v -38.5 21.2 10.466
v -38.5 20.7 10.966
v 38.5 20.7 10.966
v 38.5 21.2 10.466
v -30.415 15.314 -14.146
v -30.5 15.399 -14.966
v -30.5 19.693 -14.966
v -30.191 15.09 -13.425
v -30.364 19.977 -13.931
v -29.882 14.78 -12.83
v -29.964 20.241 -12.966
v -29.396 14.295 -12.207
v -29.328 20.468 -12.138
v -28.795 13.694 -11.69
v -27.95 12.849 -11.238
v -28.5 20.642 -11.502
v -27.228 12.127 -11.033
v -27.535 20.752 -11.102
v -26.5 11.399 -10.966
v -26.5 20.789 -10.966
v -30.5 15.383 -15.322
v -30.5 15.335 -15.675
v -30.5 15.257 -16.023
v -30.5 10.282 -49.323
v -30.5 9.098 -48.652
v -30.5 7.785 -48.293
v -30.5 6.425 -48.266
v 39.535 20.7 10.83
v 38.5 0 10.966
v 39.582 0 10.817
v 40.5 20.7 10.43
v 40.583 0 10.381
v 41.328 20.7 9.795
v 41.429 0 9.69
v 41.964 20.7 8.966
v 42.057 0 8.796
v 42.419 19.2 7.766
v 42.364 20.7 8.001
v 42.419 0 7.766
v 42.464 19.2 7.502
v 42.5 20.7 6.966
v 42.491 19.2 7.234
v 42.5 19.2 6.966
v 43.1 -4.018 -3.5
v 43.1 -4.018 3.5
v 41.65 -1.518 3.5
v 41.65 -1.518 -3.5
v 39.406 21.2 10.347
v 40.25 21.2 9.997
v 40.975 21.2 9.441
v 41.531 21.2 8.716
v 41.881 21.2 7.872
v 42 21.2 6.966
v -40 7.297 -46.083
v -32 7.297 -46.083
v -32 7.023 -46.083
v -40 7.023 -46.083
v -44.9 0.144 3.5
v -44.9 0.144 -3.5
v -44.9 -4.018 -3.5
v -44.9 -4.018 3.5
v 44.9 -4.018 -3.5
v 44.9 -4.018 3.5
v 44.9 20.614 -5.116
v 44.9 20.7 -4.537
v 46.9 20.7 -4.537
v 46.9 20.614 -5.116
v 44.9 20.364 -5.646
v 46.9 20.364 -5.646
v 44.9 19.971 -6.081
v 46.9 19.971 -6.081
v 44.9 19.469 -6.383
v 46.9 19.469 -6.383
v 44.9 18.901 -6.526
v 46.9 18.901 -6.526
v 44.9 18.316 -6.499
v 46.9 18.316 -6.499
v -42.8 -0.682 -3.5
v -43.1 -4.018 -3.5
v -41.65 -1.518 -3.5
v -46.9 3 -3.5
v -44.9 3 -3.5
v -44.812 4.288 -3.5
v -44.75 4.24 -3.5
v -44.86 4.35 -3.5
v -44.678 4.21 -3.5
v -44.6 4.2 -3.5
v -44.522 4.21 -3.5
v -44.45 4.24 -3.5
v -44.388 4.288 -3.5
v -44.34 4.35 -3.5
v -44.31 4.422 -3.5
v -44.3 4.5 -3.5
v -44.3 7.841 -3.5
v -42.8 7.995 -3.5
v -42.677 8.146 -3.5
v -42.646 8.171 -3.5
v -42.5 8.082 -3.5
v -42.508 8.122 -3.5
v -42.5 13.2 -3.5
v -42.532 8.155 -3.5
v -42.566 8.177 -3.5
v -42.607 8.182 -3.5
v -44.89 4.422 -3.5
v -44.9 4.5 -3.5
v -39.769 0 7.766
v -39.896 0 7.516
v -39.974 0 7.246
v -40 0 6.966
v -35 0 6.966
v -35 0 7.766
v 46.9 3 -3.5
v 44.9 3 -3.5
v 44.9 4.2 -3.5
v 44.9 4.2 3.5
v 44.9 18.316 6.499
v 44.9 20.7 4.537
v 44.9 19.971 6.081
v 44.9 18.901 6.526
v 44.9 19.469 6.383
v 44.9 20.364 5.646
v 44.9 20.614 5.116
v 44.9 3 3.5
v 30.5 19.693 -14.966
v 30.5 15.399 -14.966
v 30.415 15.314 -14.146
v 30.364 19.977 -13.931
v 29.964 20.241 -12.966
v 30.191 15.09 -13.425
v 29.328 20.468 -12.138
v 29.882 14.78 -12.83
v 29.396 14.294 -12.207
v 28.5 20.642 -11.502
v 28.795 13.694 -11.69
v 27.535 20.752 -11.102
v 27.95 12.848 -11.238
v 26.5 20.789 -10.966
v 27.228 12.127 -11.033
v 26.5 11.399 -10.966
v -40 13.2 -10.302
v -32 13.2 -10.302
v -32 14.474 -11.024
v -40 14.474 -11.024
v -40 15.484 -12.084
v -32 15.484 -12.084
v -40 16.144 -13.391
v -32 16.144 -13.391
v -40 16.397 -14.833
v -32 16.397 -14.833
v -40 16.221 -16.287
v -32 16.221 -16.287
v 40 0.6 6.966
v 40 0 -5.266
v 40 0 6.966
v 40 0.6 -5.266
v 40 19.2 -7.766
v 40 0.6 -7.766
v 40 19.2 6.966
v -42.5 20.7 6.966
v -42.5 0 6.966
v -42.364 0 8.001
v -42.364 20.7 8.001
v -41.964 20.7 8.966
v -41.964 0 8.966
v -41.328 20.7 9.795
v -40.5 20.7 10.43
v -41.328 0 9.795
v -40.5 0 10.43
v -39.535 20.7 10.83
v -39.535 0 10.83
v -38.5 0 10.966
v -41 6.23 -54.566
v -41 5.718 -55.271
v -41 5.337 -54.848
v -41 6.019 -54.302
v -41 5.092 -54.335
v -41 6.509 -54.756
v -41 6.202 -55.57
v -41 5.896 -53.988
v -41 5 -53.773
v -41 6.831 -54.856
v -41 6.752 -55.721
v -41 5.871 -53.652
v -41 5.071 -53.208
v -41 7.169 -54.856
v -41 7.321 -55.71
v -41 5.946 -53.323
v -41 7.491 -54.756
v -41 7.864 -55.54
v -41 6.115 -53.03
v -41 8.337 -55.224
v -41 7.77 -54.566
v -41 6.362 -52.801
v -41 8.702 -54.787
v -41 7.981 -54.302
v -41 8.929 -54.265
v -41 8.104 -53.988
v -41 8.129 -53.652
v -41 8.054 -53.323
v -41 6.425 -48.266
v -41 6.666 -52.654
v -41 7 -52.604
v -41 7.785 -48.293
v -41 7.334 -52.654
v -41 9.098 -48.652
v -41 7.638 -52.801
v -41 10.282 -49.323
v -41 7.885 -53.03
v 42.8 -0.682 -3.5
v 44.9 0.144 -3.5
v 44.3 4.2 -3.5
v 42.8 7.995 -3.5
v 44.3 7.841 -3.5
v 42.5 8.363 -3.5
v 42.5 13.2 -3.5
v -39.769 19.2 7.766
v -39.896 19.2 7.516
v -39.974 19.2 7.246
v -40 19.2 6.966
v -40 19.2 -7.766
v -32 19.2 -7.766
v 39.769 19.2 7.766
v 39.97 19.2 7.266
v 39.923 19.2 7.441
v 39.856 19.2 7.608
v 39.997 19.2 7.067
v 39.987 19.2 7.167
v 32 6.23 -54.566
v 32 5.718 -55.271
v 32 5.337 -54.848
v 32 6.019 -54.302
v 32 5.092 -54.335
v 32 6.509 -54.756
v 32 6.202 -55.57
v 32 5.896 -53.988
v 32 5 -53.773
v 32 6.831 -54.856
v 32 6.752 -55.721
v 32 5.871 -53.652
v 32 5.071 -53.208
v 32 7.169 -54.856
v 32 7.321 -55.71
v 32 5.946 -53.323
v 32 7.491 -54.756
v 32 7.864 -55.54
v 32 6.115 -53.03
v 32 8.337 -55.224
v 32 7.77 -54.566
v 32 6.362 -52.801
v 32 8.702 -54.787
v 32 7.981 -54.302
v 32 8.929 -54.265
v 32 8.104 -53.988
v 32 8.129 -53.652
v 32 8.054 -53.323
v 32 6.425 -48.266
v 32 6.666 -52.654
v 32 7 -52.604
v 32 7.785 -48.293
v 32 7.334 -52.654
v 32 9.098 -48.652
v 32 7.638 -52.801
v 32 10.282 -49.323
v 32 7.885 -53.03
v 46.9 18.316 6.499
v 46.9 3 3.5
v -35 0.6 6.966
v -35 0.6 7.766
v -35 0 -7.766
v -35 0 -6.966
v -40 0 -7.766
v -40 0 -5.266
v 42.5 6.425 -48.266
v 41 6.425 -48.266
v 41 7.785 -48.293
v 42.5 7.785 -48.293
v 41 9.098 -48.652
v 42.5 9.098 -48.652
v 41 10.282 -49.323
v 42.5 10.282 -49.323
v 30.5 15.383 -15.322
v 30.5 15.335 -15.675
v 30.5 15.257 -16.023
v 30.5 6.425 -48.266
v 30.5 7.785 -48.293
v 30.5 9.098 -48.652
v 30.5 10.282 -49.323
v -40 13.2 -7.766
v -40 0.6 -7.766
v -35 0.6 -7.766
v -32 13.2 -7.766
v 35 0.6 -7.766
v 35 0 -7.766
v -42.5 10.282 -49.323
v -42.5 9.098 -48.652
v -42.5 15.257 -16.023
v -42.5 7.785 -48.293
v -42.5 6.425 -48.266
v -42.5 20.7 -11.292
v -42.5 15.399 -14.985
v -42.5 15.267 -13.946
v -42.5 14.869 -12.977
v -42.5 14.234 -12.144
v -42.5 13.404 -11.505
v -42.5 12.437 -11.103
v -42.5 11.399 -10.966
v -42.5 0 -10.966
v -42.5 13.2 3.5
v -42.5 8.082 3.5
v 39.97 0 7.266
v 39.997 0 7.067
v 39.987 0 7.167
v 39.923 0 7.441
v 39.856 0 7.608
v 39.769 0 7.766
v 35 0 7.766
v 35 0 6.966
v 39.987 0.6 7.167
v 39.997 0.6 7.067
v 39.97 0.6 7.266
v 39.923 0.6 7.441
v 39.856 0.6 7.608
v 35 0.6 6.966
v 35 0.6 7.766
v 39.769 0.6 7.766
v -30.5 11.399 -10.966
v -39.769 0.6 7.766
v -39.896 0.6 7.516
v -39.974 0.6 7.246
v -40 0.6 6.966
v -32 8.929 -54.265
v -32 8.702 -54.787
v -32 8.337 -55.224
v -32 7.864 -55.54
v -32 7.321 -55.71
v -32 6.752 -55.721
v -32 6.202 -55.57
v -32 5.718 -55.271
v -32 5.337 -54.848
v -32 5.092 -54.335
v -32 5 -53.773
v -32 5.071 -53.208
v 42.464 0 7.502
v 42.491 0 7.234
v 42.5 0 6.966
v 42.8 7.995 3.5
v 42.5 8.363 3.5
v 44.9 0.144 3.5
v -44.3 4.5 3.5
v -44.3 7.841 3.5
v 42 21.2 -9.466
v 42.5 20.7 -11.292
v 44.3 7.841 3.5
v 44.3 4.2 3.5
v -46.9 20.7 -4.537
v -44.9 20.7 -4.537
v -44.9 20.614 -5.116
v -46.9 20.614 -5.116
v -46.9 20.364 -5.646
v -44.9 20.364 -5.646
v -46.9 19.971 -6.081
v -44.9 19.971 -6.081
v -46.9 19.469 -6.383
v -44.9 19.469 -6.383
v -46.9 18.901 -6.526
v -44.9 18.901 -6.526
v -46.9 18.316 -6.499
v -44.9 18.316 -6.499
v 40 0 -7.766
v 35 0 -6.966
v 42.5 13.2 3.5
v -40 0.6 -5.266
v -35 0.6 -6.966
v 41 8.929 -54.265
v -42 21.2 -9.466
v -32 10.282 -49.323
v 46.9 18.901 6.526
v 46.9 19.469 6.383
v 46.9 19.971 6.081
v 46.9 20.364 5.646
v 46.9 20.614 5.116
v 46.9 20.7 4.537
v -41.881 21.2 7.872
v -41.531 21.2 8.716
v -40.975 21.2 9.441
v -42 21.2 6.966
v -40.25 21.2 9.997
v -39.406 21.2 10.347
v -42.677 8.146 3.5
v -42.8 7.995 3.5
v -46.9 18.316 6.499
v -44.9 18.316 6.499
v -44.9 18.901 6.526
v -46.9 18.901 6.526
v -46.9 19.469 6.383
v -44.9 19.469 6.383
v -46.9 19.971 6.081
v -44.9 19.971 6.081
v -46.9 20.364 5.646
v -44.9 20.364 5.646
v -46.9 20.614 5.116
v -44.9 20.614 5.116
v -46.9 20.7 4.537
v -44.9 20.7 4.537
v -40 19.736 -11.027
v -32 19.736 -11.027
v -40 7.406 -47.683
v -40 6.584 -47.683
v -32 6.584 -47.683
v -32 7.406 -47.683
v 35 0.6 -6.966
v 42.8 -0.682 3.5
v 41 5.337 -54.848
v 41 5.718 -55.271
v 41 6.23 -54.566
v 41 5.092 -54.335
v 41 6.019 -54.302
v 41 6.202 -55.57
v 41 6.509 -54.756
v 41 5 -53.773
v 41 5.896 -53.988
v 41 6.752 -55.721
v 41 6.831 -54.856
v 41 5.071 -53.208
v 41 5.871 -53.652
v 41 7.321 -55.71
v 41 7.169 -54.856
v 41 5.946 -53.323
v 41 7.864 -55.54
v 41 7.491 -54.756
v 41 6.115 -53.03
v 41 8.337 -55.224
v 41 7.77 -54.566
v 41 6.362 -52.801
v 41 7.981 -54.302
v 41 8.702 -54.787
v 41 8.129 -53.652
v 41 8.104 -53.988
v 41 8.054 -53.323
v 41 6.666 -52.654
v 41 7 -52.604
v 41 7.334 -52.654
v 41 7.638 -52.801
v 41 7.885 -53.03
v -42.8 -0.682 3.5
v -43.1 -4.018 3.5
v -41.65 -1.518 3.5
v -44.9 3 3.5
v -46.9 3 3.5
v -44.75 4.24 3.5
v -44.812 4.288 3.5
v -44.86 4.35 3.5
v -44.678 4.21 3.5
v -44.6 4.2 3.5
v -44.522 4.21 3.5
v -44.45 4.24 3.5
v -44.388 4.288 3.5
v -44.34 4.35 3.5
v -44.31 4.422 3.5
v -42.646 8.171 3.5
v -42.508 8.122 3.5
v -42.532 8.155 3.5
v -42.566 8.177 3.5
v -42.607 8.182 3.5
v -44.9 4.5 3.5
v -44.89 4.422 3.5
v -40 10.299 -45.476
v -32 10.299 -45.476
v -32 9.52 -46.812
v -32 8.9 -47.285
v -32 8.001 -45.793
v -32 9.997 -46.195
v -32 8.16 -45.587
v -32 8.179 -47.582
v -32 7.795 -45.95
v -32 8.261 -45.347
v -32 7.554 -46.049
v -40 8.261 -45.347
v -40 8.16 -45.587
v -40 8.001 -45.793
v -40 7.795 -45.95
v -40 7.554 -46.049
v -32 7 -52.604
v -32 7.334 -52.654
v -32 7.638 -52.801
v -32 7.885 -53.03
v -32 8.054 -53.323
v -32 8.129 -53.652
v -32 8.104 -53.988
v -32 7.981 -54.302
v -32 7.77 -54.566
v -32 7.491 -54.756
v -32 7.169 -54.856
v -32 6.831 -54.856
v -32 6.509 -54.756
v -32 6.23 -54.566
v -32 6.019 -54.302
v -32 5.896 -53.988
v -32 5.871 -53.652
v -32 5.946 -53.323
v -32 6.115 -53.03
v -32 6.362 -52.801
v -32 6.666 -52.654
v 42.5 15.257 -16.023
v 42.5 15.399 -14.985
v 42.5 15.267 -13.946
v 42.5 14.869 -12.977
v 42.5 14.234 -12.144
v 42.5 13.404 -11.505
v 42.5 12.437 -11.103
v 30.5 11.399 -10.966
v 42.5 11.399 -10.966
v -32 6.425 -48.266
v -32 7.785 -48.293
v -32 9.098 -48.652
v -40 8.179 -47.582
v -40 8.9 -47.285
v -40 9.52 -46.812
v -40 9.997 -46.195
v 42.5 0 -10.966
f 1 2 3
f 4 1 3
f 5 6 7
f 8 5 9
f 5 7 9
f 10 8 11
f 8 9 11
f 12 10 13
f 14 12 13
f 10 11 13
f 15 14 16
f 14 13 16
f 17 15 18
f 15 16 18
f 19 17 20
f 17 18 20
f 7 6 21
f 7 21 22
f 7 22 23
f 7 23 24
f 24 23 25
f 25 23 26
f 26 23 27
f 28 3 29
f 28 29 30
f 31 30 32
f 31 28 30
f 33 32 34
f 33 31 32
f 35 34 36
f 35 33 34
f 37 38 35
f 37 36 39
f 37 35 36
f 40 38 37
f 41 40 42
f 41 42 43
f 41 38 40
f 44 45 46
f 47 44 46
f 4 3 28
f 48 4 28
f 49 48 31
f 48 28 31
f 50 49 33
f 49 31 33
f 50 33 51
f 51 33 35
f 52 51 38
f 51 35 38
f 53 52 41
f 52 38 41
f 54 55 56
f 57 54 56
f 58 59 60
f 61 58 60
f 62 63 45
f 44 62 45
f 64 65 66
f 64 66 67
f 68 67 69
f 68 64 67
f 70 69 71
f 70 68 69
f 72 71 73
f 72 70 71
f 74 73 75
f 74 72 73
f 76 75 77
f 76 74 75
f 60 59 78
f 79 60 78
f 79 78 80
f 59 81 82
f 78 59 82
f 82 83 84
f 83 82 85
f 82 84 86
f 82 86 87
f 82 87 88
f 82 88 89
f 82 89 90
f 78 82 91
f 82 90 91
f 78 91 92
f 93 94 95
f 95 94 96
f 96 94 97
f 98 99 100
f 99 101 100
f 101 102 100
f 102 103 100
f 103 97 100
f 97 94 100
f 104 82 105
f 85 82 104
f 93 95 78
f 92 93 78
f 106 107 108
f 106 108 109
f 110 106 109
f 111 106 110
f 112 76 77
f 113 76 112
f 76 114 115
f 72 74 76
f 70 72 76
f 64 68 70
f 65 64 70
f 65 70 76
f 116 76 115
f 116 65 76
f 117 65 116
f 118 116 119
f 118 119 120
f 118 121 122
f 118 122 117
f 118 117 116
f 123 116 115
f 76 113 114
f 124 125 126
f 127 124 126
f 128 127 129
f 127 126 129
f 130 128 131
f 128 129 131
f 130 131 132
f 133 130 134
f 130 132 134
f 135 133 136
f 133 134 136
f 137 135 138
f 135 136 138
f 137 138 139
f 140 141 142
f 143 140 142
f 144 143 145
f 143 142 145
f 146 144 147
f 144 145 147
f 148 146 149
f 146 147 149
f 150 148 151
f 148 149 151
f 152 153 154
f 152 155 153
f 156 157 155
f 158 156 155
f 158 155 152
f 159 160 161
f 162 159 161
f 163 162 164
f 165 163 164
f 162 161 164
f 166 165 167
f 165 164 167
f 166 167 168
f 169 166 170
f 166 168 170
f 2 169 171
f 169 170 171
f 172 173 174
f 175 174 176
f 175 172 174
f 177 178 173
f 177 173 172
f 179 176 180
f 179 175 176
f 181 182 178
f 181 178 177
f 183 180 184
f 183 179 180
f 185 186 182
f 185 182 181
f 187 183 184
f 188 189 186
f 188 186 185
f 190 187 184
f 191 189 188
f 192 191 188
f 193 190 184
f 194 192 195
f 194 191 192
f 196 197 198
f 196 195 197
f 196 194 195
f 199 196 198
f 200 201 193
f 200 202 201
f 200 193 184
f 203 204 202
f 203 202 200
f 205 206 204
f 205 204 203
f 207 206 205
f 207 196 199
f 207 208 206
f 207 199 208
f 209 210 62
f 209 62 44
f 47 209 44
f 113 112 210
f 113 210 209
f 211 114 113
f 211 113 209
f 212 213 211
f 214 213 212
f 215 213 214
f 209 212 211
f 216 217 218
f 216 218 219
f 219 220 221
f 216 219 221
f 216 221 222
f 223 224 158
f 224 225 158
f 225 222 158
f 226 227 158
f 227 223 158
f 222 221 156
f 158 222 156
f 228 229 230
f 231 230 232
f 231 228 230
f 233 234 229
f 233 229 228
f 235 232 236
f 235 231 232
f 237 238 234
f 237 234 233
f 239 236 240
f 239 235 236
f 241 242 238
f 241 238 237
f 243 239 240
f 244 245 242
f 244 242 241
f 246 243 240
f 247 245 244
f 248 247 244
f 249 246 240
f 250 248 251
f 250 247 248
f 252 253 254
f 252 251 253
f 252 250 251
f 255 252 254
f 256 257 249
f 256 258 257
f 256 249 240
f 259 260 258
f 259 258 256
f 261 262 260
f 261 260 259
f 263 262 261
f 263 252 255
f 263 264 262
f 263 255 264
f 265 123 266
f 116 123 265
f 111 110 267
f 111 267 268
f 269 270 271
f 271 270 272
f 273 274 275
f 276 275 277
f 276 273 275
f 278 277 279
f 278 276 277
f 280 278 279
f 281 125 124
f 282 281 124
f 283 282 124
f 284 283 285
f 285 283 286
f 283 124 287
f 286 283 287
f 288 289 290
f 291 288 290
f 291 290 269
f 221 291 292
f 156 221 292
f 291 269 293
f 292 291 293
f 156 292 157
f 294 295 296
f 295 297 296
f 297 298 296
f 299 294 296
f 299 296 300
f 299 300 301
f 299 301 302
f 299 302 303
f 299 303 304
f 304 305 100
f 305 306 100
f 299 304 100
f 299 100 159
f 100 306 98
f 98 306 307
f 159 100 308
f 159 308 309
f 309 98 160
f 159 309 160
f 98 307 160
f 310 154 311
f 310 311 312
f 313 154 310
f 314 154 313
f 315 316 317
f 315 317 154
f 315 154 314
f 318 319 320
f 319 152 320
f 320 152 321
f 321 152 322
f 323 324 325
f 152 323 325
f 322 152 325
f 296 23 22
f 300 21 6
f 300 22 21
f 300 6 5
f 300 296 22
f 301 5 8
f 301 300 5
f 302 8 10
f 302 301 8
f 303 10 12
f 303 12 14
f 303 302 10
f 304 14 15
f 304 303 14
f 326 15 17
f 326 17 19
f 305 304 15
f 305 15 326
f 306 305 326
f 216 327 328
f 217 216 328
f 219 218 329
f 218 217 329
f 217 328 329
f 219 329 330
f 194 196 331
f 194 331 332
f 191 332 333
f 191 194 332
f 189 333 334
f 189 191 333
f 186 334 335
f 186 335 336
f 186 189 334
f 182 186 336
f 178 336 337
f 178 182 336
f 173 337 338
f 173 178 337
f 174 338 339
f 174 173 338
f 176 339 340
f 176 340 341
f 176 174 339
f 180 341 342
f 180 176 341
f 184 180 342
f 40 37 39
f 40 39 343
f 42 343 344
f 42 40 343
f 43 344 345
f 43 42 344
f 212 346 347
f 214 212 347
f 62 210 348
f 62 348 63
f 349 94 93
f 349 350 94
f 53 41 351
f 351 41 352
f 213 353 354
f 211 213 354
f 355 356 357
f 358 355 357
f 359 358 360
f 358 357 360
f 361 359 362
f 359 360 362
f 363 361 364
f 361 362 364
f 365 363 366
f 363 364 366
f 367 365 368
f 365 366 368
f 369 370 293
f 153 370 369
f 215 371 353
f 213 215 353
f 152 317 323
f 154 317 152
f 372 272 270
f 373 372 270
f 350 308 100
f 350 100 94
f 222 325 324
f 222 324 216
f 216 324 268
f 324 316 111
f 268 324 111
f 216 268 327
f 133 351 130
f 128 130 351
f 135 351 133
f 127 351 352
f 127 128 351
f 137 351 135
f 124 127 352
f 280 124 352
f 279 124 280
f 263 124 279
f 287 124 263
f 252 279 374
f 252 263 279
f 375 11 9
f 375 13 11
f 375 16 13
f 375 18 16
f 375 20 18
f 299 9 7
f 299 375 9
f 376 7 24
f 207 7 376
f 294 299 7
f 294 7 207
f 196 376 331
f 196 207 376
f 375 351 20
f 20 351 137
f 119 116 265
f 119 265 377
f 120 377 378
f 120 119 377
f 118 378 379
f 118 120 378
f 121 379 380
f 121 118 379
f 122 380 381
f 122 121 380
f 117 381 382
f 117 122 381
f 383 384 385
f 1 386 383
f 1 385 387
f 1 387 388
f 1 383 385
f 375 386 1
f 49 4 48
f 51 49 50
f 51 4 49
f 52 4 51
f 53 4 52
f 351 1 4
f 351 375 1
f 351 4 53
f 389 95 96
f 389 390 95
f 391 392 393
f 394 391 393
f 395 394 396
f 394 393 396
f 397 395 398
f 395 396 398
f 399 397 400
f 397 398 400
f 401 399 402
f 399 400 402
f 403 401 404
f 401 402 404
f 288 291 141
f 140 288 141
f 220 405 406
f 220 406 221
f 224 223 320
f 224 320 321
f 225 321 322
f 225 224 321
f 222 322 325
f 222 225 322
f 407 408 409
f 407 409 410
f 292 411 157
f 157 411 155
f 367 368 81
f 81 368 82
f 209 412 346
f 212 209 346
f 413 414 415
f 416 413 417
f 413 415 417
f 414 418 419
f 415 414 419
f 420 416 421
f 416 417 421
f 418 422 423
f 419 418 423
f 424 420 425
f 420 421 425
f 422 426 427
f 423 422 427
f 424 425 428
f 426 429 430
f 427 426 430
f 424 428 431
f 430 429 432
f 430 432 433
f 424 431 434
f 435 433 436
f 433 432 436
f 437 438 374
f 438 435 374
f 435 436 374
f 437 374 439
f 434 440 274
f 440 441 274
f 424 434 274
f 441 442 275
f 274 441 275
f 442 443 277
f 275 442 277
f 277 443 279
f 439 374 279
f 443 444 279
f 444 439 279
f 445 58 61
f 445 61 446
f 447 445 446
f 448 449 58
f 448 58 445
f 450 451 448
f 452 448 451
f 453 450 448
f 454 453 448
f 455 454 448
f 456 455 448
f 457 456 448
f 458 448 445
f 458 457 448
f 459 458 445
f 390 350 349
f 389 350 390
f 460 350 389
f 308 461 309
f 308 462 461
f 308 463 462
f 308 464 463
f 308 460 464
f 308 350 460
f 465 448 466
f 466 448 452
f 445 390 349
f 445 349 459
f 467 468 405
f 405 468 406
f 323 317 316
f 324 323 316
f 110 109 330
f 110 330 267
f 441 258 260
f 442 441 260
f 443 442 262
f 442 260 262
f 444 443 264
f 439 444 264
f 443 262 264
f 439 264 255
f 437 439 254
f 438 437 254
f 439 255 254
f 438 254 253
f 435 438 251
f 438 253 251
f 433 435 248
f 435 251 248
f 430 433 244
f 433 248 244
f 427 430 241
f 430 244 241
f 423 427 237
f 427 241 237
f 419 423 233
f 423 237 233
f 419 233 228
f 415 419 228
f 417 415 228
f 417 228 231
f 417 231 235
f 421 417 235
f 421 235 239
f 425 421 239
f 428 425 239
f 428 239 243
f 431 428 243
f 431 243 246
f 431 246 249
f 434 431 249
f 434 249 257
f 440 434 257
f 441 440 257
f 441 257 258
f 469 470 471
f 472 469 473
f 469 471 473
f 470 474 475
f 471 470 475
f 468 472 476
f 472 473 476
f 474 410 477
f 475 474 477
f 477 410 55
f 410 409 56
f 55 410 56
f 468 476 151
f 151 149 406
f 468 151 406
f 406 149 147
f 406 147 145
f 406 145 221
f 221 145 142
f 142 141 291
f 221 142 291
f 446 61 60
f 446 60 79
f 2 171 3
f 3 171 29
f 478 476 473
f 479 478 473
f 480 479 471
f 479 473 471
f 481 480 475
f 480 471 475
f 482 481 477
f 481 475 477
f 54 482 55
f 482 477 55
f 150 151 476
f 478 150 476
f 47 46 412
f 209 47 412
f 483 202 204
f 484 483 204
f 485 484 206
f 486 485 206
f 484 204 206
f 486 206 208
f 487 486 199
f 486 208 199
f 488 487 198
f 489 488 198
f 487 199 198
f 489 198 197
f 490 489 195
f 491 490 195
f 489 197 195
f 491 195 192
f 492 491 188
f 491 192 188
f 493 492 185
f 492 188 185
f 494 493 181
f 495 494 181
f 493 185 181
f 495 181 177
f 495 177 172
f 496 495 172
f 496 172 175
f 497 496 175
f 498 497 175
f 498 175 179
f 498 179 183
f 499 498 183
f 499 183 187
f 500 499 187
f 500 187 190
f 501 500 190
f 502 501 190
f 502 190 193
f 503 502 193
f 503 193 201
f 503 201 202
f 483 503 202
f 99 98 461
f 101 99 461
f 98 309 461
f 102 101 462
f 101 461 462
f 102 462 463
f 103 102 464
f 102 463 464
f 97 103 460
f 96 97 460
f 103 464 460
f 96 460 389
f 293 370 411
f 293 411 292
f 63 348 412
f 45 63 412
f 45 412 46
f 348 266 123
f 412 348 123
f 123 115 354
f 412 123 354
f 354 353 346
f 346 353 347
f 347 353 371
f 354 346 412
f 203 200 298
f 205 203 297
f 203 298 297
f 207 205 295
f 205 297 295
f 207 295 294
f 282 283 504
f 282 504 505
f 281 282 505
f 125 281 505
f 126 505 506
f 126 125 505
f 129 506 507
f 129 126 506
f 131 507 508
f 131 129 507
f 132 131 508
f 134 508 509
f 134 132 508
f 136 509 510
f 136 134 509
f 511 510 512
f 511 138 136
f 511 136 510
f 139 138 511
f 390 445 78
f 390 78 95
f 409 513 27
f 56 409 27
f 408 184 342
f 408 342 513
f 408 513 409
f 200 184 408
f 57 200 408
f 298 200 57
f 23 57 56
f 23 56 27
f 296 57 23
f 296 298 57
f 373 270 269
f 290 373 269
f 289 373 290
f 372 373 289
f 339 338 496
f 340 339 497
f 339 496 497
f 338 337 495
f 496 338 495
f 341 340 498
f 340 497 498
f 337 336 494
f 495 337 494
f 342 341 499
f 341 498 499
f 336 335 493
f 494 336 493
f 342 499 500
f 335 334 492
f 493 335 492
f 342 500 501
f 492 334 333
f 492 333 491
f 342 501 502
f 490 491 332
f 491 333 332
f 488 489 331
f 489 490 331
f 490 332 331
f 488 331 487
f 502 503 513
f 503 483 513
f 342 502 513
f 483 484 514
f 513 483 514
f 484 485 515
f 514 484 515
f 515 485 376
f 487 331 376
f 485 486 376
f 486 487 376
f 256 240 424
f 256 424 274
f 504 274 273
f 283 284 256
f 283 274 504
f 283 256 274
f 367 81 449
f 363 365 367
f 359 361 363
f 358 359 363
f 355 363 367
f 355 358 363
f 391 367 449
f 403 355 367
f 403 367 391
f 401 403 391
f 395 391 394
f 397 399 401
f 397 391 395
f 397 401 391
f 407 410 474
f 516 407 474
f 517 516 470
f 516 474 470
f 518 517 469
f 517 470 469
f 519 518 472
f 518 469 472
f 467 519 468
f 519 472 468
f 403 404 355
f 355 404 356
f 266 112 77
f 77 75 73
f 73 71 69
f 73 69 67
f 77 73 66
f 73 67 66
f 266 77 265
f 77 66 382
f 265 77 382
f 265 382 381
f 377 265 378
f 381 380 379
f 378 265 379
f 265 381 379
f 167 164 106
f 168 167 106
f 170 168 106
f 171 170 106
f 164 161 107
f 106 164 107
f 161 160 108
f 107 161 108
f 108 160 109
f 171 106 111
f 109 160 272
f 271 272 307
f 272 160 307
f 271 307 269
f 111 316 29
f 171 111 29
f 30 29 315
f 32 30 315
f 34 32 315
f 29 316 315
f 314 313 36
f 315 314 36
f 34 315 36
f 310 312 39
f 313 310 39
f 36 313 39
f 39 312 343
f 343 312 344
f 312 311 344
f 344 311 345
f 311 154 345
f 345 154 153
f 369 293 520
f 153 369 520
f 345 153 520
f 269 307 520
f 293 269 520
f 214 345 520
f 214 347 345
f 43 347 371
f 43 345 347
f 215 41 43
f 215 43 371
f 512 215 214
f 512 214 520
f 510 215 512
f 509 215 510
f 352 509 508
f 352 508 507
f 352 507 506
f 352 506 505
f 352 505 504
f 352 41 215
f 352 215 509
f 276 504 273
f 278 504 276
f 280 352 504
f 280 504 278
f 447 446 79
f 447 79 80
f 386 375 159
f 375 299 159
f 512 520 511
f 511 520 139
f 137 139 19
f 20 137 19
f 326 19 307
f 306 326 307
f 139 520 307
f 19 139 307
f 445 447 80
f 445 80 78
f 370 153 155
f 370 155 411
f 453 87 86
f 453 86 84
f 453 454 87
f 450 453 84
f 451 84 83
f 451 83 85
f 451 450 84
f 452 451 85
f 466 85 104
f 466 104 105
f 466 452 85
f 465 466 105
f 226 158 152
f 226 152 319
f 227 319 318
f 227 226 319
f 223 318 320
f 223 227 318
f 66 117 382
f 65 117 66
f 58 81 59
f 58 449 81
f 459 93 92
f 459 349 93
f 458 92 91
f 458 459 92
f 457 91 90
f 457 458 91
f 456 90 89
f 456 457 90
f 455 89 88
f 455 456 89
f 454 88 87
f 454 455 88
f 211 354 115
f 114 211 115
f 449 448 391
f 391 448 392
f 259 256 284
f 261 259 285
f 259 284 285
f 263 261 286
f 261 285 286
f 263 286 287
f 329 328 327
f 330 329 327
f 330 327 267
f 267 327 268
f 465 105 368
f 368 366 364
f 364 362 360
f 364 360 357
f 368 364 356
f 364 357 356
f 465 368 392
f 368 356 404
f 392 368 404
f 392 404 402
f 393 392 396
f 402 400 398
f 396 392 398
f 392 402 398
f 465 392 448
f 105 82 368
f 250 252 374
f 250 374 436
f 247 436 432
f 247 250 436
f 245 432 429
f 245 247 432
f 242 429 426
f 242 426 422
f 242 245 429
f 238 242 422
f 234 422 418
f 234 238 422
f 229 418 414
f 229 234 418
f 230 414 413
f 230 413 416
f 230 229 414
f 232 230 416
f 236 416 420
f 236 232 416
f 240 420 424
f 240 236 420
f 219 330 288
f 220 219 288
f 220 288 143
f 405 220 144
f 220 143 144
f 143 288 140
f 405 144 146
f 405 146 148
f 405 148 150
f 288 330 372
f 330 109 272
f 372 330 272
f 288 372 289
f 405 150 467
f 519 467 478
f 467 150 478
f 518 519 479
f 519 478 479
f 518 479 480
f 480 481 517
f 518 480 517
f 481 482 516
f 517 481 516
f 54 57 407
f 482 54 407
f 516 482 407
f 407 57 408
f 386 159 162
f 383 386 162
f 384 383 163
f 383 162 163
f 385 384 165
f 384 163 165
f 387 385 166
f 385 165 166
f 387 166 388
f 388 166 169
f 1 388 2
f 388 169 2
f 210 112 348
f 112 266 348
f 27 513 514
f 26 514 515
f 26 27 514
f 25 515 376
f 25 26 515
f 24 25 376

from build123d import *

# Parameters (mm, degrees)
BOSS_EXTRUDE6_DEPTH            = 42.5
FILLET3_R                      = 4
BOSS_EXTRUDE7_DEPTH            = 19.200000225
SKETCH16_W                     = 12
SKETCH16_H                     = 56.251708931
BOSS_EXTRUDE8_DEPTH            = 21.200000225
MIRROR10_START                 = -2.25e-07
MIRROR10_DEPTH                 = 21.200000225
MIRROR10_START_2               = 19.2
MIRROR10_2_DEPTH               = 2
SKETCH17_R                     = 1.132230372
CUT_EXTRUDE3_DEPTH             = 109.502203117
CHAMFER1_SIZE                  = 0.5
SKETCH18_R                     = 5.5
CUT_EXTRUDE4_DEPTH             = 1.5
MIRROR12_COPY_1_SKETCH_R       = 5.5
MIRROR12_COPY_1_DEPTH          = 1.5
CUT_EXTRUDE7_REACH             = 100.98
CUT_EXTRUDE7_DIRECTION_2_REACH = 100.98
FILLET4_R                      = 4
SKETCH41_W                     = 5
SKETCH41_H                     = 0.8
BOSS_EXTRUDE20_DEPTH           = 0.6
BOSS_EXTRUDE21_DEPTH           = 3.5
BOSS_EXTRUDE23_DEPTH           = 2
FILLET5_R                      = 0.3
FILLET6_R                      = 0.1


# Read off the part's stored shape, not the designer's step: Mirror10
with BuildPart() as part:
    # Sketch14 → Boss-Extrude6 (new body)
    with BuildSketch(Plane(origin=(0, 0, 0), x_dir=(0, 0, -1), z_dir=(1, 0, 0))):
        Polygon((-7.766164208, -2.25e-07), (-10.966164208, -2.25e-07), (-10.966164208, 21.2), (10.966164208, 21.2), (10.966164208, -2.25e-07), (7.766164208, -2.25e-07), (7.766164208, 19.2), (-7.766164208, 19.2), align=None)
    extrude(amount=BOSS_EXTRUDE6_DEPTH)

    # Fillet3
    fillet3_edges = [part.edges().sort_by_distance(p)[0] for p in [
        (42.5, 10.599999888, 10.966164208),
    ]]
    fillet(fillet3_edges, radius=FILLET3_R)

    # Sketch15 → Boss-Extrude7 (add)
    with BuildSketch(Plane.XZ.offset(-19.2)):
        with BuildLine():
            Line((42.5, 6.966164208), (42.5, -7.766164208))
            Line((42.5, -7.766164208), (40, -7.766164208))
            Line((40, -7.766164208), (40, 6.966164208))
            ThreePointArc((40, 6.966164208), (39.99240423, 7.116927651), (39.969693846, 7.266164208))
            ThreePointArc((39.969693846, 7.266164208), (39.448683298, 8.128059212), (38.5, 8.466164208))
            Line((38.5, 8.466164208), (38.5, 10.966164208))
            ThreePointArc((38.5, 10.966164208), (41.029822128, 10.064550885), (42.419183588, 7.766164208))
            ThreePointArc((42.419183588, 7.766164208), (42.479744612, 7.368200056), (42.5, 6.966164208))
        make_face()
    extrude(amount=BOSS_EXTRUDE7_DEPTH)

    # Sketch16 → Boss-Extrude8 (add)
    with BuildSketch(Plane(origin=(0, 21.2, 0), x_dir=(1, 0, 0), z_dir=(0, 1, 0))):
        with Locations((36.5, 35.892018674)):
            Rectangle(SKETCH16_W, SKETCH16_H)
    extrude(amount=-BOSS_EXTRUDE8_DEPTH)

    # Mirror10 outline → Mirror10 (add)
    with BuildSketch(Plane(origin=(0, 0, 0), x_dir=(1, 0, 0), z_dir=(0, 1, 0)).offset(MIRROR10_START)):
        with BuildLine():
            Line((0, -7.766164208), (-39.768857754, -7.766164208))
            ThreePointArc((-39.768857754, -7.766164208), (-39.941056319, -7.382525451), (-40, -6.966164208))
            Line((-40, -6.966164208), (-40, 7.766164208))
            Line((-40, 7.766164208), (0, 7.766164208))
            Line((0, 7.766164208), (0, 10.966164208))
            Line((0, 10.966164208), (-30.5, 10.966164208))
            Line((-30.5, 10.966164208), (-30.5, 64.017873139))
            Line((-30.5, 64.017873139), (-42.5, 64.017873139))
            Line((-42.5, 64.017873139), (-42.5, -6.966164208))
            ThreePointArc((-42.5, -6.966164208), (-41.328427125, -9.794591333), (-38.5, -10.966164208))
            Line((-38.5, -10.966164208), (0, -10.966164208))
            Line((0, -10.966164208), (0, -7.766164208))
        make_face()
    extrude(amount=MIRROR10_DEPTH)

    # Mirror10 2 outline → Mirror10 2 (add)
    with BuildSketch(Plane(origin=(0, 0, 0), x_dir=(1, 0, 0), z_dir=(0, 1, 0)).offset(MIRROR10_START_2)):
        with BuildLine():
            ThreePointArc((-40, -6.966164208), (-39.941056319, -7.382525451), (-39.768857754, -7.766164208))
            Line((-39.768857754, -7.766164208), (0, -7.766164208))
            Line((0, -7.766164208), (0, 7.766164208))
            Line((0, 7.766164208), (-40, 7.766164208))
            Line((-40, 7.766164208), (-40, -6.966164208))
        make_face()
    extrude(amount=MIRROR10_2_DEPTH)

    # Sketch17 → Cut-Extrude3 (cut, through all)
    with BuildSketch(Plane.ZY.offset(42.5)):
        with Locations((-53.736263186, 6.999999775)):
            Circle(SKETCH17_R)
        with BuildLine():
            Line((-9.466164208, 21.2), (-54.264633471, 8.928943746))
            ThreePointArc((-54.264633471, 8.928943746), (-55.665207156, 6.47162949), (-53.207892901, 5.071055805))
            Line((-53.207892901, 5.071055805), (-16.022904778, 15.256651174))
            ThreePointArc((-16.022904778, 15.256651174), (-12.539949284, 14.578933218), (-10.966164208, 11.398763232))
            Line((-10.966164208, 11.398763232), (-10.966164208, -2.25e-07))
            Line((-10.966164208, -2.25e-07), (-58.949878023, -2.25e-07))
            Line((-58.949878023, -2.25e-07), (-64.017873139, -2.25e-07))
            Line((-64.017873139, -2.25e-07), (-64.017873139, 6.372862294))
            Line((-64.017873139, 6.372862294), (-64.017873139, 21.2))
            Line((-64.017873139, 21.2), (-9.466164208, 21.2))
        make_face()
    extrude(amount=-CUT_EXTRUDE3_DEPTH, mode=Mode.SUBTRACT)

    # Chamfer1
    chamfer1_edges = [part.edges().sort_by_distance(p)[0] for p in [
        (-42.5, 21.2, -1.25),
        (42.5, 21.2, -1.25),
        (19.25, 21.2, 10.966164208),
        (41.328427125, 21.2, 9.794591333),
        (-41.328427125, 21.2, 9.794591333),
    ]]
    chamfer(chamfer1_edges, length=CHAMFER1_SIZE)

    # Sketch18 → Cut-Extrude4 (cut)
    with BuildSketch(Plane.ZY.offset(42.5)):
        with Locations((-53.736263186, 6.999999775)):
            Circle(SKETCH18_R)
    cut_extrude4 = extrude(amount=-CUT_EXTRUDE4_DEPTH, mode=Mode.SUBTRACT)

    # Mirror11: Cut-Extrude4 across plane
    add(cut_extrude4.mirror(Plane.ZY.offset(36.5)), mode=Mode.SUBTRACT)

    # Mirror12: Cut-Extrude4 across plane
    add(cut_extrude4.mirror(Plane(origin=(0, 0, 0), x_dir=(0, 0, 1), z_dir=(1, 0, 0))), mode=Mode.SUBTRACT)

    # Mirror12 copy 1 sketch → Mirror12 copy 1 (cut)
    with BuildSketch(Plane.ZY.offset(-30.5)):
        with Locations((-53.736263186, 6.999999775)):
            Circle(MIRROR12_COPY_1_SKETCH_R)
    extrude(amount=-MIRROR12_COPY_1_DEPTH, mode=Mode.SUBTRACT)

    # Cut-Extrude7: up to this face of the body (flat: up to its plane)
    cut_extrude7_end = Plane(part.part.faces().sort_by_distance((-40, 9.599999887, -0.4))[0])
    # Sketch23 → Cut-Extrude7 (cut, up to the picked face)
    with BuildSketch(Plane.ZY.offset(36.5), mode=Mode.PRIVATE) as cut_extrude7_sk1:
        with BuildLine():
            Line((-16.287089921, 16.221123159), (-45.347315212, 8.261037353))
            ThreePointArc((-45.347315212, 8.261037353), (-45.878172566, 7.903119099), (-46.083130069, 7.296565368))
            Line((-46.083130069, 7.296565368), (-46.083130069, 7.022648503))
            Line((-46.083130069, 7.022648503), (-47.68348017, 6.584285621))
            Line((-47.68348017, 6.584285621), (-47.68348017, 7.406036215))
            ThreePointArc((-47.68348017, 7.406036215), (-47.068607659, 9.225697409), (-45.476035597, 10.299452171))
            Line((-45.476035597, 10.299452171), (-11.027350425, 19.735528015))
            Line((-11.027350425, 19.735528015), (-7.766164208, 19.2))
            Line((-7.766164208, 19.2), (-7.766164208, 13.2))
            Line((-7.766164208, 13.2), (-10.301880115, 13.2))
            ThreePointArc((-10.301880115, 13.2), (-12.713097942, 15.862359585), (-16.287089921, 16.221123159))
        make_face()
    cut_extrude7_tool1 = split(extrude(cut_extrude7_sk1.sketch, amount=CUT_EXTRUDE7_REACH, mode=Mode.PRIVATE), bisect_by=cut_extrude7_end, keep=Keep.BOTH, mode=Mode.PRIVATE)
    add(cut_extrude7_tool1.solids().sort_by(Axis((-36.5, 14.283351, -24.707146), (-1, 0, 0)))[0], mode=Mode.SUBTRACT)

    # Cut-Extrude7 direction 2: up to this face of the body (flat: up to its plane)
    cut_extrude7_direction_2_end = Plane(part.part.faces().sort_by_distance((-32, 7.583720498, -51.605249006))[0])
    # Sketch23 → Cut-Extrude7 direction 2 (cut, up to the picked face)
    with BuildSketch(Plane.ZY.offset(36.5), mode=Mode.PRIVATE) as cut_extrude7_direction_2_sk1:
        with BuildLine():
            Line((-16.287089921, 16.221123159), (-45.347315212, 8.261037353))
            ThreePointArc((-45.347315212, 8.261037353), (-45.878172566, 7.903119099), (-46.083130069, 7.296565368))
            Line((-46.083130069, 7.296565368), (-46.083130069, 7.022648503))
            Line((-46.083130069, 7.022648503), (-47.68348017, 6.584285621))
            Line((-47.68348017, 6.584285621), (-47.68348017, 7.406036215))
            ThreePointArc((-47.68348017, 7.406036215), (-47.068607659, 9.225697409), (-45.476035597, 10.299452171))
            Line((-45.476035597, 10.299452171), (-11.027350425, 19.735528015))
            Line((-11.027350425, 19.735528015), (-7.766164208, 19.2))
            Line((-7.766164208, 19.2), (-7.766164208, 13.2))
            Line((-7.766164208, 13.2), (-10.301880115, 13.2))
            ThreePointArc((-10.301880115, 13.2), (-12.713097942, 15.862359585), (-16.287089921, 16.221123159))
        make_face()
    cut_extrude7_direction_2_tool1 = split(extrude(cut_extrude7_direction_2_sk1.sketch, amount=-CUT_EXTRUDE7_DIRECTION_2_REACH, mode=Mode.PRIVATE), bisect_by=cut_extrude7_direction_2_end, keep=Keep.BOTH, mode=Mode.PRIVATE)
    add(cut_extrude7_direction_2_tool1.solids().sort_by(Axis((-36.5, 14.283351, -24.707146), (1, 0, 0)))[0], mode=Mode.SUBTRACT)

    # Fillet4
    fillet4_edges = [part.edges().sort_by_distance(p)[0] for p in [
        (-30.5, 16.093943968, -10.966164208),
        (30.5, 16.093943967, -10.966164208),
    ]]
    fillet(fillet4_edges, radius=FILLET4_R)

    # Sketch41 → Boss-Extrude20 (add)
    with BuildSketch(Plane.XZ):
        Polygon((-40, -5.266164208), (-35, -6.966164208), (-35, -7.766164208), (-40, -7.766164208), align=None)
        Polygon((35, -6.966164208), (35, -7.766164208), (40, -7.766164208), (40, -5.266164208), align=None)
        with Locations((-37.5, 7.366164208)):
            Rectangle(SKETCH41_W, SKETCH41_H)
        with Locations((37.5, 7.366164208)):
            Rectangle(SKETCH41_W, SKETCH41_H)
    extrude(amount=-BOSS_EXTRUDE20_DEPTH)

    # Sketch42 → Boss-Extrude21 (add, symmetric)
    with BuildSketch(Plane.XY):
        Polygon((-44.9, 0.143703762), (-44.9, -4.017561374), (-43.1, -4.017561374), (-41.65, -1.517561374), (-42.8, -0.682037466), (-42.8, 7.995486209), (-42.5, 8.363098451), (-42.5, 13.2), (-44.3, 7.840797374), (-44.3, 4.199999775), (-44.9, 4.199999775), (-44.9, 2.999999775), (-46.9, 2.999999775), align=None)
    boss_extrude21 = extrude(amount=BOSS_EXTRUDE21_DEPTH, both=True)

    # Sketch44 → Boss-Extrude23 (add)
    with BuildSketch(Plane.ZY.offset(44.9)):
        with BuildLine():
            Line((-3.5, 2.999999775), (3.5, 2.999999775))
            Line((3.5, 2.999999775), (6.499239291, 18.315643504))
            ThreePointArc((6.499239291, 18.315643504), (6.080655383, 19.971079661), (4.536519218, 20.7))
            Line((4.536519218, 20.7), (-4.536519218, 20.7))
            ThreePointArc((-4.536519218, 20.7), (-6.080655383, 19.971079661), (-6.499239291, 18.315643504))
            Line((-6.499239291, 18.315643504), (-3.5, 2.999999775))
        make_face()
    boss_extrude23 = extrude(amount=BOSS_EXTRUDE23_DEPTH)

    # Mirror13: Boss-Extrude21, Boss-Extrude23 across plane
    add(boss_extrude21.mirror(Plane(origin=(0, 0, 0), x_dir=(0, 0, 1), z_dir=(1, 0, 0))))
    add(boss_extrude23.mirror(Plane(origin=(0, 0, 0), x_dir=(0, 0, 1), z_dir=(1, 0, 0))))

    # Fillet5
    fillet5_edges = [part.edges().sort_by_distance(p)[0] for p in [
        (-44.9, 4.199999775, 0),
        (-44.3, 4.199999775, 0),
    ]]
    fillet(fillet5_edges, radius=FILLET5_R - 0.0001)  # a hair under: the kernel refuses the full size

    # Fillet6
    fillet6_edges = [part.edges().sort_by_distance(p)[0] for p in [
        (-42.5, 8.363098451, 0),
    ]]
    fillet(fillet6_edges, radius=FILLET6_R)


solid = part.part
